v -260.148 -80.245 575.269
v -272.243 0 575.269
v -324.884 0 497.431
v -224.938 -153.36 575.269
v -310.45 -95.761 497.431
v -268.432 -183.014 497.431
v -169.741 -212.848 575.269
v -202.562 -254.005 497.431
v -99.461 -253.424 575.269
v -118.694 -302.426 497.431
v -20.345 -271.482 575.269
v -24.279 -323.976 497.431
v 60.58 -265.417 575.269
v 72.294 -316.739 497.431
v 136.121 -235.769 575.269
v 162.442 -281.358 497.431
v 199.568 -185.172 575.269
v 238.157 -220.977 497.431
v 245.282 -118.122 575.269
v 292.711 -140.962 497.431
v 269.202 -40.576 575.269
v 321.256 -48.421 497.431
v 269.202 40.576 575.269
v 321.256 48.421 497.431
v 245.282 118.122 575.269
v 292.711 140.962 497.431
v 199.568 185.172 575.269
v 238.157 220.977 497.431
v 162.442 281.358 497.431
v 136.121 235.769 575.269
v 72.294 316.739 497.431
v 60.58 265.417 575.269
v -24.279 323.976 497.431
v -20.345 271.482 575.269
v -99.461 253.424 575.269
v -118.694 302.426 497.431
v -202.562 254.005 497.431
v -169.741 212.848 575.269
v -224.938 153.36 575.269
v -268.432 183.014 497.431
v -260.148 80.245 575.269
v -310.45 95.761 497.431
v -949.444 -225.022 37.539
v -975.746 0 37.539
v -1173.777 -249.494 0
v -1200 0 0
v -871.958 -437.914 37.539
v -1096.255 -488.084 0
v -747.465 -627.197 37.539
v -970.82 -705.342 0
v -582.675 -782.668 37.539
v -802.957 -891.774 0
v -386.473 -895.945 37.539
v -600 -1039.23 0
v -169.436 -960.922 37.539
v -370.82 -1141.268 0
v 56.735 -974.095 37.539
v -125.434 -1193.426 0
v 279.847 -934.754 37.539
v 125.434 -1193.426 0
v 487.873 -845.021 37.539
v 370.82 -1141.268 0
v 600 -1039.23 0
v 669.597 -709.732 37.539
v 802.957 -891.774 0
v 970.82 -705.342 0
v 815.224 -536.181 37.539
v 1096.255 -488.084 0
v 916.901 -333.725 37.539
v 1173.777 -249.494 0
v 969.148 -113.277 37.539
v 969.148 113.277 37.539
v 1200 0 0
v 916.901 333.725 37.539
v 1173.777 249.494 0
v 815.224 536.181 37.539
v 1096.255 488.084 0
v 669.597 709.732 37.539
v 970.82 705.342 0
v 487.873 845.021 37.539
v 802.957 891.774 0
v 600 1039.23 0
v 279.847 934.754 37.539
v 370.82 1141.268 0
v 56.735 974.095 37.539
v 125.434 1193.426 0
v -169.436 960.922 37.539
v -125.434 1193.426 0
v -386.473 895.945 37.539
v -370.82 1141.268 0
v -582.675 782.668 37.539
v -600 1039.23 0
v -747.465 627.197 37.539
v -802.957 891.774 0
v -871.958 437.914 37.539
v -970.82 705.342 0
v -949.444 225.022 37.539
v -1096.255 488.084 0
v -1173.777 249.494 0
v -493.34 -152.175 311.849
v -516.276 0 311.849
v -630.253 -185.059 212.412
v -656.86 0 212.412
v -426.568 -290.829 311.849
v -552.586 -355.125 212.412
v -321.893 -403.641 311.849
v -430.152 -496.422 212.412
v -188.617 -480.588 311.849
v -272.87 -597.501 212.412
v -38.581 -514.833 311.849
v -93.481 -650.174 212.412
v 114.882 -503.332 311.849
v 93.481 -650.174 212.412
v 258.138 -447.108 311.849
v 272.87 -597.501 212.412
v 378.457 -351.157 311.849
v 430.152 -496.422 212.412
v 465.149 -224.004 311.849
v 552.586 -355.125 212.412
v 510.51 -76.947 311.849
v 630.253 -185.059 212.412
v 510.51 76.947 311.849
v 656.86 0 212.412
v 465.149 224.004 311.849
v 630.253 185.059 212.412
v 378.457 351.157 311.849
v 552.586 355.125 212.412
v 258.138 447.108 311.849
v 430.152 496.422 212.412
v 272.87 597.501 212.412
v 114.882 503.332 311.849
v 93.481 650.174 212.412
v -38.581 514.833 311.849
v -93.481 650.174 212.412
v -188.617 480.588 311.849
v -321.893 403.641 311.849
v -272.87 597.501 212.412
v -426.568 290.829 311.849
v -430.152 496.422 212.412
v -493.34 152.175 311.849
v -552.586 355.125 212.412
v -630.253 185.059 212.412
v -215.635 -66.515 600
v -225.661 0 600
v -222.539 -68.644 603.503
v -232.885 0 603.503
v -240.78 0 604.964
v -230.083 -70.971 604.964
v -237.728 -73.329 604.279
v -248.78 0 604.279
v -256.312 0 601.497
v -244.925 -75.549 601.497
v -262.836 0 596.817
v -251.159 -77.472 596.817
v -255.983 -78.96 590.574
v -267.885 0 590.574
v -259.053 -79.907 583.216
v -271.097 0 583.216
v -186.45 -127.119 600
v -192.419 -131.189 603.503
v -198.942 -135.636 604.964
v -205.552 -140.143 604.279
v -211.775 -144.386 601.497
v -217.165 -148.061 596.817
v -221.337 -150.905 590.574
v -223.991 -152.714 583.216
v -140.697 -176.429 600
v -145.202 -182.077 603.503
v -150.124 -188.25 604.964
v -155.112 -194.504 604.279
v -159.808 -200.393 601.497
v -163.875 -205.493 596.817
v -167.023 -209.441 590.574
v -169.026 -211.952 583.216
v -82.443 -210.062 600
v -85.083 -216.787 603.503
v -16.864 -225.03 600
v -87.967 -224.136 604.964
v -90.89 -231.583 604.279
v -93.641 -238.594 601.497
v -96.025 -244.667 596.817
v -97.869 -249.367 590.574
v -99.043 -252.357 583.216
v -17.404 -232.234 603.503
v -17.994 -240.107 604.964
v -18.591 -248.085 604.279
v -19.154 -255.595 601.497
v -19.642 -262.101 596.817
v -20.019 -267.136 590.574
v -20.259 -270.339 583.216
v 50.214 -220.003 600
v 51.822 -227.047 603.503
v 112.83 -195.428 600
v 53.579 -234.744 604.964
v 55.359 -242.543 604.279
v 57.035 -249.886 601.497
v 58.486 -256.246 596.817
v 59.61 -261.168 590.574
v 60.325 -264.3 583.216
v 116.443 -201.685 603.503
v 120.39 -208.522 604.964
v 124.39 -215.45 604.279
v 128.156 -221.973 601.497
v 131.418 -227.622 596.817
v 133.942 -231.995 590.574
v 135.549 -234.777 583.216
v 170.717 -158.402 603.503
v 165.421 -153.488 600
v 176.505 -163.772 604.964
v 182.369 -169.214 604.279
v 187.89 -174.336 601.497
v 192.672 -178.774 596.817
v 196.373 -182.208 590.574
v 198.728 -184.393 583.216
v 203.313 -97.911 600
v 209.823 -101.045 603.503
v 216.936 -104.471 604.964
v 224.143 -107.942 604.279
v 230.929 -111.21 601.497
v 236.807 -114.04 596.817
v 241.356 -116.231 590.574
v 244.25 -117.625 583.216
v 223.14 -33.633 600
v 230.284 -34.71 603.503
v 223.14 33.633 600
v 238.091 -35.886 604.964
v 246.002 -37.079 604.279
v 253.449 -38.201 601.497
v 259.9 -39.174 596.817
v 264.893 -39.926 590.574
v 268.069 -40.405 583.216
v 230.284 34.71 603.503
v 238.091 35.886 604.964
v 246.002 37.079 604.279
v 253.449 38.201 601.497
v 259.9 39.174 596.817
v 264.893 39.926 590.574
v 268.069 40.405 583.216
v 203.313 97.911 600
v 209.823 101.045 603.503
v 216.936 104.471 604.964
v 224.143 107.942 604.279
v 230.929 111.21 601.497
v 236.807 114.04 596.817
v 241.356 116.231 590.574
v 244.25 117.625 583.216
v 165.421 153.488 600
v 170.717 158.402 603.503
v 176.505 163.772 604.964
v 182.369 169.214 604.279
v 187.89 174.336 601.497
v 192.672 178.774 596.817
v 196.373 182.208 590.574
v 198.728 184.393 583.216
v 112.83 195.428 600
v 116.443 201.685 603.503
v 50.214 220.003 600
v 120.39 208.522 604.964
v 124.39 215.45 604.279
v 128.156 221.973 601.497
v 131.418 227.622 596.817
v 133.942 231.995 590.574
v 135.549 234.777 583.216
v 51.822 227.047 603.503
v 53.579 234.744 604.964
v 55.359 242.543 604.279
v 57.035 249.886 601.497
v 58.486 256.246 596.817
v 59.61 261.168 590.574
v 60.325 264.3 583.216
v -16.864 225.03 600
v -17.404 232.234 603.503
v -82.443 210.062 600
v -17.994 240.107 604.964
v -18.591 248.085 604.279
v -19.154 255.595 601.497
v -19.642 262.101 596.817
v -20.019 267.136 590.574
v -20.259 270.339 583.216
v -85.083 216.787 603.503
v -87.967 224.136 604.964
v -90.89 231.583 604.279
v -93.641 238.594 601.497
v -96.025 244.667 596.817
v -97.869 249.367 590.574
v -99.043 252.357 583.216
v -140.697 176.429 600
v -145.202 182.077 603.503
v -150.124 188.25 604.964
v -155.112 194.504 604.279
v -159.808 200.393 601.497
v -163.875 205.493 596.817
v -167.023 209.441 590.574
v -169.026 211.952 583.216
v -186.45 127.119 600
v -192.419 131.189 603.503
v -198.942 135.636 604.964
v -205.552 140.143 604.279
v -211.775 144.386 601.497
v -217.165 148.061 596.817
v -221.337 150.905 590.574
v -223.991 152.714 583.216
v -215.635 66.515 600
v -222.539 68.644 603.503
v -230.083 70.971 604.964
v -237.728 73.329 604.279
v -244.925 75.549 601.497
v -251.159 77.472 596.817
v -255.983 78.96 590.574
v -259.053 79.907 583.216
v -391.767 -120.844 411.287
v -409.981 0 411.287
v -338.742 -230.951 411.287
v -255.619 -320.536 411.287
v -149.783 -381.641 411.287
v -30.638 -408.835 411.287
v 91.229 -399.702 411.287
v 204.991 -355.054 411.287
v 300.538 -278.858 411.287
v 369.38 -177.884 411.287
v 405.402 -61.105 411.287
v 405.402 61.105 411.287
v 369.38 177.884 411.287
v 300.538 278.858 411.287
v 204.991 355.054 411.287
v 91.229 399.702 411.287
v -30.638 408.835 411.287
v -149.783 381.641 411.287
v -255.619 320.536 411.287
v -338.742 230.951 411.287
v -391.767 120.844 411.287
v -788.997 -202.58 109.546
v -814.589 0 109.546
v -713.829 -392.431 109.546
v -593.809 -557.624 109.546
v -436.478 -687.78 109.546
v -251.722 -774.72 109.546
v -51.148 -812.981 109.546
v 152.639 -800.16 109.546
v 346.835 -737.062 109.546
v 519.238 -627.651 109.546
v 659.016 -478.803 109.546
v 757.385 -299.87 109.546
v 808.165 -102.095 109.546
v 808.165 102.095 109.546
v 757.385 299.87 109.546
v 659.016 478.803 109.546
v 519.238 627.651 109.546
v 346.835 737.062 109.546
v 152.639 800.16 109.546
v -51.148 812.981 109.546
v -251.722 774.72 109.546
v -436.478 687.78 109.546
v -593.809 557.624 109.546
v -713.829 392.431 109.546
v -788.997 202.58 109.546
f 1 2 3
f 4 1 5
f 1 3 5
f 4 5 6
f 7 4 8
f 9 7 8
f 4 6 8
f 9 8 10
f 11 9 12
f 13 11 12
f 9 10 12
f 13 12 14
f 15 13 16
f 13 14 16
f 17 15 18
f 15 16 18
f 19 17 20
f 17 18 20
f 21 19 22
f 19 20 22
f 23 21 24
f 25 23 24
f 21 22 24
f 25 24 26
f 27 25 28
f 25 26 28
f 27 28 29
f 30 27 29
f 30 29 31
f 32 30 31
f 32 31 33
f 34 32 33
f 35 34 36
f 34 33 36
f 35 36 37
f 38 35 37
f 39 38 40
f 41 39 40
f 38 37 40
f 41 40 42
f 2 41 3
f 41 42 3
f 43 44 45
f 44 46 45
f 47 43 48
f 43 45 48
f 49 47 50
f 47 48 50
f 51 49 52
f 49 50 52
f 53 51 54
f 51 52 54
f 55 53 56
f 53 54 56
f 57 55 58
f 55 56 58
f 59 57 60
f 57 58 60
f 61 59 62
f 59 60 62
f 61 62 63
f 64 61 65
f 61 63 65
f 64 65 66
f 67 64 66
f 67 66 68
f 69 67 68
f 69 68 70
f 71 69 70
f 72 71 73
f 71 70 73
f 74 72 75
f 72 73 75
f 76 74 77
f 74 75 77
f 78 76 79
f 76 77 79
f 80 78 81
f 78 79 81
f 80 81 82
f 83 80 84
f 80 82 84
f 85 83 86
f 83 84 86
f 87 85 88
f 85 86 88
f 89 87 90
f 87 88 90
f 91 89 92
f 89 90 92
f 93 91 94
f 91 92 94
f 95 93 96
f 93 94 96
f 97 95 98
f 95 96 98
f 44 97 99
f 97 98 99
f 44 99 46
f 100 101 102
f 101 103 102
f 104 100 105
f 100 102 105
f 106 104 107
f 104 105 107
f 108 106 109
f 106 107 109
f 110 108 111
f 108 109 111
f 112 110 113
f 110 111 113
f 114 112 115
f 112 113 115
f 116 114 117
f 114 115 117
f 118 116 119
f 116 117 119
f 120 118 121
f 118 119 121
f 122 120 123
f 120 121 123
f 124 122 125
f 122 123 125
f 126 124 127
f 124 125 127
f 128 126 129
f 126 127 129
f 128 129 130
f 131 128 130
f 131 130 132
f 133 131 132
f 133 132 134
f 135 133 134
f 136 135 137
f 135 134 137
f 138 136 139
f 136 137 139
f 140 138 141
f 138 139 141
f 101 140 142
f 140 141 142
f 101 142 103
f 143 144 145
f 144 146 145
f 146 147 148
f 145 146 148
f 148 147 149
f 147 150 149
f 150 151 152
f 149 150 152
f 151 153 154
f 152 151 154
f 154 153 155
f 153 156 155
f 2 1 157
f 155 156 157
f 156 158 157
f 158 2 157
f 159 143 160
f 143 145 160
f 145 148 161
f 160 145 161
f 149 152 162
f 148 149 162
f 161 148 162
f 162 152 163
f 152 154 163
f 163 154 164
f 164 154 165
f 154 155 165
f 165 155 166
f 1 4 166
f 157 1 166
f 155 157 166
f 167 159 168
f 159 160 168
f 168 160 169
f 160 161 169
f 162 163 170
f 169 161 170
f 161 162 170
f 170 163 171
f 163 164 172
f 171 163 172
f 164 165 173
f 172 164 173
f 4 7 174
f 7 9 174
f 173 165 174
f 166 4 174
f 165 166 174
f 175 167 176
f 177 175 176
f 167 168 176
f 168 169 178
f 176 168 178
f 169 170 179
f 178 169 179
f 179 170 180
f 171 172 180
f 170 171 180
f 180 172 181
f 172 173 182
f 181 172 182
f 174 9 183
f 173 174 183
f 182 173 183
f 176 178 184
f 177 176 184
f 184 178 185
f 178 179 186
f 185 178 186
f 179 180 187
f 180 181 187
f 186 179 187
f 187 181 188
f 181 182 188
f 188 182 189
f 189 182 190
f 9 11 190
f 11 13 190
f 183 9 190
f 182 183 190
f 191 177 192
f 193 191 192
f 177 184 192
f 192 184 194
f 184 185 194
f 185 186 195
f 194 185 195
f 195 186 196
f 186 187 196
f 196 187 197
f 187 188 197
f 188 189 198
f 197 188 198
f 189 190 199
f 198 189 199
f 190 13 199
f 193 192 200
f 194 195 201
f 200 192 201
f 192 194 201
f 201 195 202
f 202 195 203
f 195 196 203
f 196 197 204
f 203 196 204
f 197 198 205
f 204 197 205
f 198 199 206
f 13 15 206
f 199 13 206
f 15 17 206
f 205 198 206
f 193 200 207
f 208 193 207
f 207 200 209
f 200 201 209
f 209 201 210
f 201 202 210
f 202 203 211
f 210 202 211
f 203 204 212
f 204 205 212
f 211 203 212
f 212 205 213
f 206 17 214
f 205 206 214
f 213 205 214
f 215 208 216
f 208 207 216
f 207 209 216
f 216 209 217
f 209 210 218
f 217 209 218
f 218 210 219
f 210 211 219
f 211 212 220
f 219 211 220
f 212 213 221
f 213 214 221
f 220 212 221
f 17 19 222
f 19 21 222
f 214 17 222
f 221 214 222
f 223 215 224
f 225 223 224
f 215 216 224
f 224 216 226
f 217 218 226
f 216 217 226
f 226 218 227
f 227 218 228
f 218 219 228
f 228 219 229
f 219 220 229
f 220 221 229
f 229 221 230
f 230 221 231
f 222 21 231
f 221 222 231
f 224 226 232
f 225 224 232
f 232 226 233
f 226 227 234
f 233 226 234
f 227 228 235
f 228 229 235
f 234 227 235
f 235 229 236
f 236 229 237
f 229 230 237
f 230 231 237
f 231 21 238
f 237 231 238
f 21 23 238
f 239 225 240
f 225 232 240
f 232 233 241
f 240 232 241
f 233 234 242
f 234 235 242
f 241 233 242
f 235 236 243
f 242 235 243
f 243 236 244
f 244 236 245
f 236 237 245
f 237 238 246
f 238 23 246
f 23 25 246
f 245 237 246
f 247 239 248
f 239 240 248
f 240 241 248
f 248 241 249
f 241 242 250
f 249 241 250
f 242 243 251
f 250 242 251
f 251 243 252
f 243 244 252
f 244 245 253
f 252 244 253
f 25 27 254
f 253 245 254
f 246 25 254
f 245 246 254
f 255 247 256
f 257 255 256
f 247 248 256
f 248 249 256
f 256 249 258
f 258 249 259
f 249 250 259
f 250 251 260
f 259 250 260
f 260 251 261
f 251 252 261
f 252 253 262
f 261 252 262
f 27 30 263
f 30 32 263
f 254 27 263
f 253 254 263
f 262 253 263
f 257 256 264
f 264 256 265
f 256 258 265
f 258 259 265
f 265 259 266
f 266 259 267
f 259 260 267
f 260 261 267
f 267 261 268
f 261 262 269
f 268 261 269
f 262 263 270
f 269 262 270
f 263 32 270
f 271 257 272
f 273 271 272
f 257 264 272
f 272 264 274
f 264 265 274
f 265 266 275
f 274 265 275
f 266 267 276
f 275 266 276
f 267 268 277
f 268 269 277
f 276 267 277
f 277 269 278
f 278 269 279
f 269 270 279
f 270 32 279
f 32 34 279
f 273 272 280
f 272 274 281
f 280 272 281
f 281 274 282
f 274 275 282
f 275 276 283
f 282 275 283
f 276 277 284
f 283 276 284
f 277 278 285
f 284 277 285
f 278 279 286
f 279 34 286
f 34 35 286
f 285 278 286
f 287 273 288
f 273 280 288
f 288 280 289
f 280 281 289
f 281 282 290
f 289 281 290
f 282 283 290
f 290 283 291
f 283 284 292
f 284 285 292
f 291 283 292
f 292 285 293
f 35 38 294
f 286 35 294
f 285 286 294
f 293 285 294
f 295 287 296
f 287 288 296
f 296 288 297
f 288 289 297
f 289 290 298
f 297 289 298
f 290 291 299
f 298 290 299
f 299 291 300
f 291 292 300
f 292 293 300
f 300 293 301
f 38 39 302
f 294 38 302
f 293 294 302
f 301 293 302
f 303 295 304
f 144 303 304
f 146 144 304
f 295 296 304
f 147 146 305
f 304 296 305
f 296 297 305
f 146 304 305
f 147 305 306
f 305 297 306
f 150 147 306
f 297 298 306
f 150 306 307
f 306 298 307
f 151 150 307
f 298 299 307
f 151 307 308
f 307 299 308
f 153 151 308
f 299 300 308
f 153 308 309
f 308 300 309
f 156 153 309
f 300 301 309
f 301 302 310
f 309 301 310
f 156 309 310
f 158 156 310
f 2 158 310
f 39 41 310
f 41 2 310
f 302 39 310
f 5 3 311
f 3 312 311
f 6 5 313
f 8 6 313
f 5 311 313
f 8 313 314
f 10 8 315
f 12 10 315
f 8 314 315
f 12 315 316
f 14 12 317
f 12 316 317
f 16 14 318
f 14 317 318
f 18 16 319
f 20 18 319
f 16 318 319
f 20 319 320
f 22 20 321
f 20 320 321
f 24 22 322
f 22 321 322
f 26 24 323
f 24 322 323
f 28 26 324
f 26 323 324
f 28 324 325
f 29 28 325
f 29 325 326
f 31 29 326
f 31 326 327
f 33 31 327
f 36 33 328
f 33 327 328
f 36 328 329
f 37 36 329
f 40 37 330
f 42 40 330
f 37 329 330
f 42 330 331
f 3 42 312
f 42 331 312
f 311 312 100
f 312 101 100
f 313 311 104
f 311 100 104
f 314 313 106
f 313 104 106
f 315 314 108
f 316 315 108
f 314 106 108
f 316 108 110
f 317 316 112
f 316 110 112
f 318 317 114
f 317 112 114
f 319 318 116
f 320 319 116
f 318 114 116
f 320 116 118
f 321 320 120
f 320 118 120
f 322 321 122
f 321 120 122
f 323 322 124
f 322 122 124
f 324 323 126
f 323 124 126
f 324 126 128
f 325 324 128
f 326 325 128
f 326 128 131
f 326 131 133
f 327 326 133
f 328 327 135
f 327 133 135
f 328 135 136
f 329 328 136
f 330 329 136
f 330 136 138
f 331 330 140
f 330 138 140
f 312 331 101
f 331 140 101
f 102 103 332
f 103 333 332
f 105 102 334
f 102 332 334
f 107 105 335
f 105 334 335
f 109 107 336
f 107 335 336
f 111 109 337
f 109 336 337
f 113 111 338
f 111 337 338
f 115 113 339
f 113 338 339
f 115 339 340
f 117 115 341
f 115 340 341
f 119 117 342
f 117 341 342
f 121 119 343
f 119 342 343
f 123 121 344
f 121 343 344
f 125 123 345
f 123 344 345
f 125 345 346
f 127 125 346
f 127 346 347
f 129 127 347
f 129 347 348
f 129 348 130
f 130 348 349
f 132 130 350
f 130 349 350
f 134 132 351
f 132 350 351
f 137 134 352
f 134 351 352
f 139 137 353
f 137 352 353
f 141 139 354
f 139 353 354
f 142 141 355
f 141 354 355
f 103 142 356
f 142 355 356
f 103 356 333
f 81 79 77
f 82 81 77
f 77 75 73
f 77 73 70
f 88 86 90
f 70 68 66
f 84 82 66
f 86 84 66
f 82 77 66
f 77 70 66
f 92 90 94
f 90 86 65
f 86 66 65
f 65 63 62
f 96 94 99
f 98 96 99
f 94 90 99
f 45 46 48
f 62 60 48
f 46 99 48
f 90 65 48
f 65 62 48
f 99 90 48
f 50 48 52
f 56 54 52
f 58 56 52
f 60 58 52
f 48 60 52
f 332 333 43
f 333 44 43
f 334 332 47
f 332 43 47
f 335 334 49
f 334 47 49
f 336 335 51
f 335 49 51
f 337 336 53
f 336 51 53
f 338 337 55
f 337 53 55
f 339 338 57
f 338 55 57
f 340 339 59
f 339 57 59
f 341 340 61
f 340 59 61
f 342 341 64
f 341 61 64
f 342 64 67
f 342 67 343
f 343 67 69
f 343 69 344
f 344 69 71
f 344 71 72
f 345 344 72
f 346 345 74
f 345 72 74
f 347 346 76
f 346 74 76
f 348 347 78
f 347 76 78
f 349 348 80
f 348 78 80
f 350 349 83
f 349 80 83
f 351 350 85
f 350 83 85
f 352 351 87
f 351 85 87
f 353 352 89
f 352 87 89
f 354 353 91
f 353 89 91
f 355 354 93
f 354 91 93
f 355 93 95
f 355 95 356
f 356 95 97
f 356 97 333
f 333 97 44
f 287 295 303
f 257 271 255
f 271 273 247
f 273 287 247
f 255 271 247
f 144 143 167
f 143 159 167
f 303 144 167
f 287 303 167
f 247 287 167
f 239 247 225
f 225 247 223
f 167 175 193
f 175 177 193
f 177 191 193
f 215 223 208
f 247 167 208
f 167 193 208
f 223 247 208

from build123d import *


with BuildPart() as f1:
    # F0 (on Front) → F1 (revolve)
    with BuildSketch(Plane.XZ):
        with BuildLine():
            Line((-1200, 0), (0, 0))
            Line((0, 0), (0, 600))
            Line((0, 600), (-225.6608514491, 600))
            ThreePointArc((-225.6608514491, 600), (-215.8101550324, 589.1863716546), (-212.2439754009, 575))
            ThreePointArc((-212.2439754009, 575), (-242.3783227085, 545.0003008215), (-272.242772121, 575.2686919208))
            Line((-272.242772121, 575.2686919208), (-324.8841910881, 497.4312875862))
            Line((-324.8841910881, 497.4312875862), (-409.9812209606, 411.2867414951))
            Line((-409.9812209606, 411.2867414951), (-516.2763595581, 311.8493556976))
            Line((-516.2763595581, 311.8493556976), (-656.8602919579, 212.411954999))
            Line((-656.8602919579, 212.411954999), (-814.5885467529, 109.5456704497))
            Line((-814.5885467529, 109.5456704497), (-975.7457375526, 37.539280951))
            Line((-975.7457375526, 37.539280951), (-1200, 0))
        make_face()
        with BuildLine():
            ThreePointArc((-212.2439754009, 575), (-215.8101550324, 589.1863716546), (-225.6608514491, 600))
            Line((-225.6608514491, 600), (-255.5169940541, 600))
            Line((-255.5169940541, 600), (-272.242772121, 575.2686919208))
            ThreePointArc((-272.242772121, 575.2686919208), (-242.3783227085, 545.0003008215), (-212.2439754009, 575))
        make_face()
        with BuildLine():
            Line((-255.5169940541, 600), (-225.6608514491, 600))
            ThreePointArc((-225.6608514491, 600), (-256.3118277169, 601.4970853344), (-272.242772121, 575.2686919208))
            Line((-272.242772121, 575.2686919208), (-255.5169940541, 600))
        make_face()
    revolve(axis=Axis((0, 0, 300), (0, 0, 1)))


solid = f1.part
